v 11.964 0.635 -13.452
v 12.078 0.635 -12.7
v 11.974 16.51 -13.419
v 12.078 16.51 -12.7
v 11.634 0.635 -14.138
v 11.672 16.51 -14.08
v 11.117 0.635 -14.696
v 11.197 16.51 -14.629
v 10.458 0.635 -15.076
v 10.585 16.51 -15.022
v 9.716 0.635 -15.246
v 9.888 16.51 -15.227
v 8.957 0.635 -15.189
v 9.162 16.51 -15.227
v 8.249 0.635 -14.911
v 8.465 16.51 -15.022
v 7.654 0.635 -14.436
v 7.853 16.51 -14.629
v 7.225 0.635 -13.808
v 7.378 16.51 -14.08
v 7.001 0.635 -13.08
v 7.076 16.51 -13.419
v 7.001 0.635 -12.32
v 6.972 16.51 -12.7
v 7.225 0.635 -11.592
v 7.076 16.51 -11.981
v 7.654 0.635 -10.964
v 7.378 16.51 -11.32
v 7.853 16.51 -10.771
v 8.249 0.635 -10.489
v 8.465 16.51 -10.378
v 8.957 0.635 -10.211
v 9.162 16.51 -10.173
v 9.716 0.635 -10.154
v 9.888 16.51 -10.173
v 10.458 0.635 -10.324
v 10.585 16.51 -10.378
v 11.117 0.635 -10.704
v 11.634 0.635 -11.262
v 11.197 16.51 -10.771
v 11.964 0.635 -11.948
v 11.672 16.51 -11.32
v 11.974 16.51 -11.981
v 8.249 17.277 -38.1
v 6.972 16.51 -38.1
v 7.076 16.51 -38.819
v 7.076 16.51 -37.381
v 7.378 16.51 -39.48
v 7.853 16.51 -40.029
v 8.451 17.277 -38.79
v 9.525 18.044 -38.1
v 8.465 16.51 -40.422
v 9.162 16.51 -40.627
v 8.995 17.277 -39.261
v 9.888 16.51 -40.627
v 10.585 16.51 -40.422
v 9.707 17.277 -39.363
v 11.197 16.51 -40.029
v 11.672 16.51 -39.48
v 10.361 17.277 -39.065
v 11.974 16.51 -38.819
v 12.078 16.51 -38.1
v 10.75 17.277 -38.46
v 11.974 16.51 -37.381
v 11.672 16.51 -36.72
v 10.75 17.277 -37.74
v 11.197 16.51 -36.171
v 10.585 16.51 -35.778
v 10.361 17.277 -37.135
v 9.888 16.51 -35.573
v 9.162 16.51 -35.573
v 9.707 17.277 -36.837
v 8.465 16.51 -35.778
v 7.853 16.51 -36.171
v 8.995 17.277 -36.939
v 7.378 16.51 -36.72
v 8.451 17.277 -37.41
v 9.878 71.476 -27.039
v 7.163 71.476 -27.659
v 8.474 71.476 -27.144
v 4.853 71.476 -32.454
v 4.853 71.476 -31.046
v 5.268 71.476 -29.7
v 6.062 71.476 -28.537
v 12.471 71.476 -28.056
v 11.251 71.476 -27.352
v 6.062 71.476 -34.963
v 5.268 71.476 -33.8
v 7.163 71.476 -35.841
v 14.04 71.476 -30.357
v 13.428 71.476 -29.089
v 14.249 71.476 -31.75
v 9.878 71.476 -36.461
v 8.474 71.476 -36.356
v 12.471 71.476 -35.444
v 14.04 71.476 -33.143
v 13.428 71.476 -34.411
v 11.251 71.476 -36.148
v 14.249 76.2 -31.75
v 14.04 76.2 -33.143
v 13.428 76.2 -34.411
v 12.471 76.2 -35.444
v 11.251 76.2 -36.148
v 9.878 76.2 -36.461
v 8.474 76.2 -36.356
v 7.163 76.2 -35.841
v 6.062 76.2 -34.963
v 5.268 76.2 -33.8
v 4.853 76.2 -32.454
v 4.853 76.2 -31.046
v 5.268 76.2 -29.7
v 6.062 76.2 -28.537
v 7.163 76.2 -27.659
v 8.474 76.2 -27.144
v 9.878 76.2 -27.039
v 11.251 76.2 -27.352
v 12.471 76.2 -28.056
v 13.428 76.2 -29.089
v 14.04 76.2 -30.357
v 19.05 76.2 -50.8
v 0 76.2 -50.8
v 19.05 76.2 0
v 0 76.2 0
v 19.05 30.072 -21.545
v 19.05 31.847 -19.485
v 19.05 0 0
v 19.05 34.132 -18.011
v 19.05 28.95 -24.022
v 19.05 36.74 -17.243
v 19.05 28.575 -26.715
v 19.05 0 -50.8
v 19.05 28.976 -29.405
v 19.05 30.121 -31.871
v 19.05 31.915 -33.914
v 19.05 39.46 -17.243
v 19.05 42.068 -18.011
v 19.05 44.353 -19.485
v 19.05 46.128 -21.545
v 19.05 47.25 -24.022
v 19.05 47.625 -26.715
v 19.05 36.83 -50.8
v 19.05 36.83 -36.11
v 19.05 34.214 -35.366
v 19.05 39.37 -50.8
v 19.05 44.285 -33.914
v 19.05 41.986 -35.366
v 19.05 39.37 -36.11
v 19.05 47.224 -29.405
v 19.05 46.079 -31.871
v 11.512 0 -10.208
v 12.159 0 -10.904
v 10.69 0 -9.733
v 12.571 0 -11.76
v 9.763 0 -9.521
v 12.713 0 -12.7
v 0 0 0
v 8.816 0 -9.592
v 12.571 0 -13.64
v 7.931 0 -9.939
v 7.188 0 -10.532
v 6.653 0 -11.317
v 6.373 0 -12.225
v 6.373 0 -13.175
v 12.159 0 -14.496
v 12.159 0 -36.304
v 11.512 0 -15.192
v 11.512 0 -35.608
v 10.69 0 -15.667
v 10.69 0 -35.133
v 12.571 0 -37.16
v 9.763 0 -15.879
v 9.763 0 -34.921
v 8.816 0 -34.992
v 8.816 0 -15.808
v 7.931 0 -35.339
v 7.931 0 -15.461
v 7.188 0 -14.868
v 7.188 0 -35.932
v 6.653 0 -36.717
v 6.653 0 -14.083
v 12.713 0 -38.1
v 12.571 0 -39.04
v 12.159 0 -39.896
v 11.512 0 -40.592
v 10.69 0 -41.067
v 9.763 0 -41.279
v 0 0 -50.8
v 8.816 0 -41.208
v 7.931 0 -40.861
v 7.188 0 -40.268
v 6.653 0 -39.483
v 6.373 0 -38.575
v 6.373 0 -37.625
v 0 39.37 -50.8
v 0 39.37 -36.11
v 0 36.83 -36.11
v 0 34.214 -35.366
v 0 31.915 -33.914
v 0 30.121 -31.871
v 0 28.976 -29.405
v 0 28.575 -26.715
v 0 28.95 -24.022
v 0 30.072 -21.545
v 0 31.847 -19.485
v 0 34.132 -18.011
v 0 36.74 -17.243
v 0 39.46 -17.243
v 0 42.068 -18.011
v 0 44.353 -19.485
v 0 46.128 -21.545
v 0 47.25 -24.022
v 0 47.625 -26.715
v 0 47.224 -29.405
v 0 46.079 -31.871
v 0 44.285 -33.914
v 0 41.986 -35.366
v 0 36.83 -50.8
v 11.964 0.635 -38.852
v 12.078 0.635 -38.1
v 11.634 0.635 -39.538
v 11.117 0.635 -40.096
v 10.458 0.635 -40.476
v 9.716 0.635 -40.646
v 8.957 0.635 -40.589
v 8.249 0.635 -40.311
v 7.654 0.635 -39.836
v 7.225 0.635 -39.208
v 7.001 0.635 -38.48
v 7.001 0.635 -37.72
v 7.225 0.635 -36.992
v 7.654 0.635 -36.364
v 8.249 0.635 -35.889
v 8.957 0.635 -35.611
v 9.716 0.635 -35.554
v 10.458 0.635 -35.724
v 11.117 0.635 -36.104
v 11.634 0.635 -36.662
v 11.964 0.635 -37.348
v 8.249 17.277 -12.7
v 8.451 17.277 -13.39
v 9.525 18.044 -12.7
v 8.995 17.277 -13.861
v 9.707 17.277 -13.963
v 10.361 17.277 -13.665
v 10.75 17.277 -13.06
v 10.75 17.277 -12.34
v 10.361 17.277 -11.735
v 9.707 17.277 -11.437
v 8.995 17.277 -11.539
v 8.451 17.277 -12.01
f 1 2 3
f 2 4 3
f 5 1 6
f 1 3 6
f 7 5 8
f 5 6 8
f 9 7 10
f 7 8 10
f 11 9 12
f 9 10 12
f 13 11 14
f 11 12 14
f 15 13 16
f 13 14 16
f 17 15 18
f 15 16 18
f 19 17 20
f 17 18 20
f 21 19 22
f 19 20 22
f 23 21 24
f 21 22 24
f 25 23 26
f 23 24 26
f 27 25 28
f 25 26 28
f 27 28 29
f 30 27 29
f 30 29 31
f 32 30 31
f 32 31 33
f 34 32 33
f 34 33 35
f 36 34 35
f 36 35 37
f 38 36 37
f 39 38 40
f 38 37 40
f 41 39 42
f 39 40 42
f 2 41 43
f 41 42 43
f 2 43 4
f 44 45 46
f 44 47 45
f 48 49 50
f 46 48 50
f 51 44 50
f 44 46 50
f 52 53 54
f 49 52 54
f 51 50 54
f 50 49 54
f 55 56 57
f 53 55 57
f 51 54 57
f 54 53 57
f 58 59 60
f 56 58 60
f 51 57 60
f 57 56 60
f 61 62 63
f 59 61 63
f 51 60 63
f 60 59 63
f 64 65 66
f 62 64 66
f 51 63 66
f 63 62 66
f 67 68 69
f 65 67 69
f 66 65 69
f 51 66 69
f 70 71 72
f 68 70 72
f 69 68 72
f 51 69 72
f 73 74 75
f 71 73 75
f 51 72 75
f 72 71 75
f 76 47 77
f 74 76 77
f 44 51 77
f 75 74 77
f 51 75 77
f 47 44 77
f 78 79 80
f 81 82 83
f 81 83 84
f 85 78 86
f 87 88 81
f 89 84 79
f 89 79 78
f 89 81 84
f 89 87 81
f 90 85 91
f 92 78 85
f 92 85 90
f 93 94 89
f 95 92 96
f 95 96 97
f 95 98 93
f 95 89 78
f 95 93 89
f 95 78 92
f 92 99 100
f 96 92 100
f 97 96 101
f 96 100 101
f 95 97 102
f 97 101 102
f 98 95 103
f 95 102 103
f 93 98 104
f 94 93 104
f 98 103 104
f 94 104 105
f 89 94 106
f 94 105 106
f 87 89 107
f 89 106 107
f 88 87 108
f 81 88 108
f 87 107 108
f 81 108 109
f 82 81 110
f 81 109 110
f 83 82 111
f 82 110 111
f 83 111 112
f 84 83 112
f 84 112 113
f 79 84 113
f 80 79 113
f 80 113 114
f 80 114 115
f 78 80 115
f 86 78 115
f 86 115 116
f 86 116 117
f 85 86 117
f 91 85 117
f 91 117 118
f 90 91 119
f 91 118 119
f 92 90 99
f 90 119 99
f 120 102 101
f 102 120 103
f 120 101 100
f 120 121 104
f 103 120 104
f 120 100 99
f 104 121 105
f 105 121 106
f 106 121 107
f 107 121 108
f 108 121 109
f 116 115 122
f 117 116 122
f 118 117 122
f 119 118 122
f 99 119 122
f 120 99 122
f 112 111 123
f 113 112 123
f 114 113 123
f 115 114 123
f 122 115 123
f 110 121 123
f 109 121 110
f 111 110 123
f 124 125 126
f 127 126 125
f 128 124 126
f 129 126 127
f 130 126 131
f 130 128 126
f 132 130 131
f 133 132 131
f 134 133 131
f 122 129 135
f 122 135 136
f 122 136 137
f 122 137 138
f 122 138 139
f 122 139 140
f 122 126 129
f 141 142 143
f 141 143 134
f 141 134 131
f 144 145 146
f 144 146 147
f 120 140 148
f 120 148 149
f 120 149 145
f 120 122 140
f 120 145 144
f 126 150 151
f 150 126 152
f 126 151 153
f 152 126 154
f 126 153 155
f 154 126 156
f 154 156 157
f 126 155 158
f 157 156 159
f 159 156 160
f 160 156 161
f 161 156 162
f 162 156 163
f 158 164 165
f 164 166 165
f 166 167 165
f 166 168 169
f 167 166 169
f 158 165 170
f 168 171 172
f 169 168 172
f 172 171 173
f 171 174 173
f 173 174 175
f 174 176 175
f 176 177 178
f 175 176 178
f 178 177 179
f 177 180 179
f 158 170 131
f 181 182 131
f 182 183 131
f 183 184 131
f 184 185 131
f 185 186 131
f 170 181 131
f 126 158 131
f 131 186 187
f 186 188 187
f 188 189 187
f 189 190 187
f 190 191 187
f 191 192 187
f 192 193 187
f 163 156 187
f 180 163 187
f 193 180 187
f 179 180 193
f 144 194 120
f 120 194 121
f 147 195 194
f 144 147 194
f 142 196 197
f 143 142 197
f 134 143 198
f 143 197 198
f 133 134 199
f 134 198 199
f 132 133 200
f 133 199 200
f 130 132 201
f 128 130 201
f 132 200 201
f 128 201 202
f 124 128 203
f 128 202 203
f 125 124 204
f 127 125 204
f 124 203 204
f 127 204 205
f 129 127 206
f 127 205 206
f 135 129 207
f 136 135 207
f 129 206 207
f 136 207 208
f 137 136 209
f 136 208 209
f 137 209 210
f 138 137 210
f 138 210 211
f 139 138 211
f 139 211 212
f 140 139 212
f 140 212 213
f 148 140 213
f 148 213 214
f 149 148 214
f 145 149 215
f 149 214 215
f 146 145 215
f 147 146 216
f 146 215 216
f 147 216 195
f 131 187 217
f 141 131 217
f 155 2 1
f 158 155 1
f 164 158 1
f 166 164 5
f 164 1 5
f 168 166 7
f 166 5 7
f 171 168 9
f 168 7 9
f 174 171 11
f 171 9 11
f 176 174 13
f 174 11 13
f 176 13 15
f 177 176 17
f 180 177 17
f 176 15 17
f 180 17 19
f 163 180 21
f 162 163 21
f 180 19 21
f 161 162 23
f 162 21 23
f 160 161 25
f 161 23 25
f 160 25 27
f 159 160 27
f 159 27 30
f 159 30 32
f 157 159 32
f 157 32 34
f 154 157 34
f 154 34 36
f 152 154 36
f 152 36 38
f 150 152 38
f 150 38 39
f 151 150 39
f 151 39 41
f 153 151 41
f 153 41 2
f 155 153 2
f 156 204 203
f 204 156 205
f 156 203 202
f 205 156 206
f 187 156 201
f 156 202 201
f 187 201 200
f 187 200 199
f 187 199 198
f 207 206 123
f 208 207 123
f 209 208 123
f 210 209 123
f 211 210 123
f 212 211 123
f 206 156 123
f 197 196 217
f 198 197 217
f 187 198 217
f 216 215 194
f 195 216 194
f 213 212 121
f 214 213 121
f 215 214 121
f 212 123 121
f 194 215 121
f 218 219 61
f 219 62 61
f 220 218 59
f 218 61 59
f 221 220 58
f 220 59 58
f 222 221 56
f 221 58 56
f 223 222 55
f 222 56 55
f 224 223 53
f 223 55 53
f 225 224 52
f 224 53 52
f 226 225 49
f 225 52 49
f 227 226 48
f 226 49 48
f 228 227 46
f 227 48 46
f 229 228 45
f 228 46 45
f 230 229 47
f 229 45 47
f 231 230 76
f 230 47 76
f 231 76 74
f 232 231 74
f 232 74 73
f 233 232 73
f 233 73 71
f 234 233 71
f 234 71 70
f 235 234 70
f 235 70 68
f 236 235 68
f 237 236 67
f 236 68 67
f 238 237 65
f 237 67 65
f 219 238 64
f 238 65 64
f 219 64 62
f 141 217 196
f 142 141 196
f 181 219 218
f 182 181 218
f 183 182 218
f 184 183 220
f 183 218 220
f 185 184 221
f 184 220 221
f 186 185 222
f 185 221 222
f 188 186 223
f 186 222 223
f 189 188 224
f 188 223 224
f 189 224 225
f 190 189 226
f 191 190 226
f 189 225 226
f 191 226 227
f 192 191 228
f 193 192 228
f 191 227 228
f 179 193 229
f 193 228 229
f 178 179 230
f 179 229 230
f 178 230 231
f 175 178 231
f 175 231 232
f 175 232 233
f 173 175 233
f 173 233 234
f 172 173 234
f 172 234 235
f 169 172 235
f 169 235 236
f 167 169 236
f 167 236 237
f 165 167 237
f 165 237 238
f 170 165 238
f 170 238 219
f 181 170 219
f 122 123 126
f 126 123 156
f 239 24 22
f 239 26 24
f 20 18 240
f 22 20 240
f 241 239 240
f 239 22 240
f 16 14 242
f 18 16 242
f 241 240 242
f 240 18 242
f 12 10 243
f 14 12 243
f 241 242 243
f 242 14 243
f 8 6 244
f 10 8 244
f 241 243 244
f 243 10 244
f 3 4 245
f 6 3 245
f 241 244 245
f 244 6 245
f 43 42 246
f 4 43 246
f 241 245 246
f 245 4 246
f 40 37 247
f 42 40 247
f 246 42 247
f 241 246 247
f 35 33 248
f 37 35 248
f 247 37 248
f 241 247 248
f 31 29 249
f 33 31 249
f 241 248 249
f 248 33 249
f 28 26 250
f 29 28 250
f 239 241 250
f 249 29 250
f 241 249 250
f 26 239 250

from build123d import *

# Parameters (mm, degrees)
BOSS_EXTRUDE1_DEPTH               = 19.05
F_1_4_20_TAPPED_HOLE1_D           = 5.1054
F_1_4_20_TAPPED_HOLE1_DEPTH       = 16.51
F_1_4_20_TAPPED_HOLE1_CSINK_D     = 6.3754
F_1_4_20_TAPPED_HOLE1_CSINK_ANGLE = 90
F_1_4_20_TAPPED_HOLE1_TIP         = 1.533816902
SKETCH3_R                         = 4.7244
CUT_EXTRUDE1_DEPTH                = 4.7244


with BuildPart() as part:
    # Sketch2 → Boss-Extrude1 (new body)
    with BuildSketch(Plane(origin=(0, 0, 0), x_dir=(0, 0, -1), z_dir=(1, 0, 0))):
        with BuildLine():
            Line((0, 0), (50.8, 0))
            Line((50.8, 0), (50.8, 36.83))
            Line((50.8, 36.83), (36.109953655, 36.83))
            ThreePointArc((36.109953655, 36.83), (17.145, 38.1), (36.109953655, 39.37))
            Line((36.109953655, 39.37), (50.8, 39.37))
            Line((50.8, 39.37), (50.8, 76.2))
            Line((50.8, 76.2), (0, 76.2))
            Line((0, 76.2), (0, 0))
        make_face()
    extrude(amount=BOSS_EXTRUDE1_DEPTH)

    # 1/4-20 Tapped Hole1
    with Locations(Plane(origin=(0, 0, 0), x_dir=(-1, 0, 0), z_dir=(0, -1, 0))):
        with Locations((-9.525, 12.7), (-9.525, 38.1)):
            CounterSinkHole(F_1_4_20_TAPPED_HOLE1_D / 2, F_1_4_20_TAPPED_HOLE1_CSINK_D / 2, depth=F_1_4_20_TAPPED_HOLE1_DEPTH, counter_sink_angle=F_1_4_20_TAPPED_HOLE1_CSINK_ANGLE)
            with Locations((0, 0, -(F_1_4_20_TAPPED_HOLE1_DEPTH + F_1_4_20_TAPPED_HOLE1_TIP / 2))):  # 118° drill point
                Cone(0, F_1_4_20_TAPPED_HOLE1_D / 2, F_1_4_20_TAPPED_HOLE1_TIP, mode=Mode.SUBTRACT)

    # Sketch3 → Cut-Extrude1 (cut)
    with BuildSketch(Plane(origin=(0, 76.2, 0), x_dir=(1, 0, 0), z_dir=(0, 1, 0))):
        with Locations((9.525, 31.75)):
            Circle(SKETCH3_R)
    extrude(amount=-CUT_EXTRUDE1_DEPTH, mode=Mode.SUBTRACT)


solid = part.part
